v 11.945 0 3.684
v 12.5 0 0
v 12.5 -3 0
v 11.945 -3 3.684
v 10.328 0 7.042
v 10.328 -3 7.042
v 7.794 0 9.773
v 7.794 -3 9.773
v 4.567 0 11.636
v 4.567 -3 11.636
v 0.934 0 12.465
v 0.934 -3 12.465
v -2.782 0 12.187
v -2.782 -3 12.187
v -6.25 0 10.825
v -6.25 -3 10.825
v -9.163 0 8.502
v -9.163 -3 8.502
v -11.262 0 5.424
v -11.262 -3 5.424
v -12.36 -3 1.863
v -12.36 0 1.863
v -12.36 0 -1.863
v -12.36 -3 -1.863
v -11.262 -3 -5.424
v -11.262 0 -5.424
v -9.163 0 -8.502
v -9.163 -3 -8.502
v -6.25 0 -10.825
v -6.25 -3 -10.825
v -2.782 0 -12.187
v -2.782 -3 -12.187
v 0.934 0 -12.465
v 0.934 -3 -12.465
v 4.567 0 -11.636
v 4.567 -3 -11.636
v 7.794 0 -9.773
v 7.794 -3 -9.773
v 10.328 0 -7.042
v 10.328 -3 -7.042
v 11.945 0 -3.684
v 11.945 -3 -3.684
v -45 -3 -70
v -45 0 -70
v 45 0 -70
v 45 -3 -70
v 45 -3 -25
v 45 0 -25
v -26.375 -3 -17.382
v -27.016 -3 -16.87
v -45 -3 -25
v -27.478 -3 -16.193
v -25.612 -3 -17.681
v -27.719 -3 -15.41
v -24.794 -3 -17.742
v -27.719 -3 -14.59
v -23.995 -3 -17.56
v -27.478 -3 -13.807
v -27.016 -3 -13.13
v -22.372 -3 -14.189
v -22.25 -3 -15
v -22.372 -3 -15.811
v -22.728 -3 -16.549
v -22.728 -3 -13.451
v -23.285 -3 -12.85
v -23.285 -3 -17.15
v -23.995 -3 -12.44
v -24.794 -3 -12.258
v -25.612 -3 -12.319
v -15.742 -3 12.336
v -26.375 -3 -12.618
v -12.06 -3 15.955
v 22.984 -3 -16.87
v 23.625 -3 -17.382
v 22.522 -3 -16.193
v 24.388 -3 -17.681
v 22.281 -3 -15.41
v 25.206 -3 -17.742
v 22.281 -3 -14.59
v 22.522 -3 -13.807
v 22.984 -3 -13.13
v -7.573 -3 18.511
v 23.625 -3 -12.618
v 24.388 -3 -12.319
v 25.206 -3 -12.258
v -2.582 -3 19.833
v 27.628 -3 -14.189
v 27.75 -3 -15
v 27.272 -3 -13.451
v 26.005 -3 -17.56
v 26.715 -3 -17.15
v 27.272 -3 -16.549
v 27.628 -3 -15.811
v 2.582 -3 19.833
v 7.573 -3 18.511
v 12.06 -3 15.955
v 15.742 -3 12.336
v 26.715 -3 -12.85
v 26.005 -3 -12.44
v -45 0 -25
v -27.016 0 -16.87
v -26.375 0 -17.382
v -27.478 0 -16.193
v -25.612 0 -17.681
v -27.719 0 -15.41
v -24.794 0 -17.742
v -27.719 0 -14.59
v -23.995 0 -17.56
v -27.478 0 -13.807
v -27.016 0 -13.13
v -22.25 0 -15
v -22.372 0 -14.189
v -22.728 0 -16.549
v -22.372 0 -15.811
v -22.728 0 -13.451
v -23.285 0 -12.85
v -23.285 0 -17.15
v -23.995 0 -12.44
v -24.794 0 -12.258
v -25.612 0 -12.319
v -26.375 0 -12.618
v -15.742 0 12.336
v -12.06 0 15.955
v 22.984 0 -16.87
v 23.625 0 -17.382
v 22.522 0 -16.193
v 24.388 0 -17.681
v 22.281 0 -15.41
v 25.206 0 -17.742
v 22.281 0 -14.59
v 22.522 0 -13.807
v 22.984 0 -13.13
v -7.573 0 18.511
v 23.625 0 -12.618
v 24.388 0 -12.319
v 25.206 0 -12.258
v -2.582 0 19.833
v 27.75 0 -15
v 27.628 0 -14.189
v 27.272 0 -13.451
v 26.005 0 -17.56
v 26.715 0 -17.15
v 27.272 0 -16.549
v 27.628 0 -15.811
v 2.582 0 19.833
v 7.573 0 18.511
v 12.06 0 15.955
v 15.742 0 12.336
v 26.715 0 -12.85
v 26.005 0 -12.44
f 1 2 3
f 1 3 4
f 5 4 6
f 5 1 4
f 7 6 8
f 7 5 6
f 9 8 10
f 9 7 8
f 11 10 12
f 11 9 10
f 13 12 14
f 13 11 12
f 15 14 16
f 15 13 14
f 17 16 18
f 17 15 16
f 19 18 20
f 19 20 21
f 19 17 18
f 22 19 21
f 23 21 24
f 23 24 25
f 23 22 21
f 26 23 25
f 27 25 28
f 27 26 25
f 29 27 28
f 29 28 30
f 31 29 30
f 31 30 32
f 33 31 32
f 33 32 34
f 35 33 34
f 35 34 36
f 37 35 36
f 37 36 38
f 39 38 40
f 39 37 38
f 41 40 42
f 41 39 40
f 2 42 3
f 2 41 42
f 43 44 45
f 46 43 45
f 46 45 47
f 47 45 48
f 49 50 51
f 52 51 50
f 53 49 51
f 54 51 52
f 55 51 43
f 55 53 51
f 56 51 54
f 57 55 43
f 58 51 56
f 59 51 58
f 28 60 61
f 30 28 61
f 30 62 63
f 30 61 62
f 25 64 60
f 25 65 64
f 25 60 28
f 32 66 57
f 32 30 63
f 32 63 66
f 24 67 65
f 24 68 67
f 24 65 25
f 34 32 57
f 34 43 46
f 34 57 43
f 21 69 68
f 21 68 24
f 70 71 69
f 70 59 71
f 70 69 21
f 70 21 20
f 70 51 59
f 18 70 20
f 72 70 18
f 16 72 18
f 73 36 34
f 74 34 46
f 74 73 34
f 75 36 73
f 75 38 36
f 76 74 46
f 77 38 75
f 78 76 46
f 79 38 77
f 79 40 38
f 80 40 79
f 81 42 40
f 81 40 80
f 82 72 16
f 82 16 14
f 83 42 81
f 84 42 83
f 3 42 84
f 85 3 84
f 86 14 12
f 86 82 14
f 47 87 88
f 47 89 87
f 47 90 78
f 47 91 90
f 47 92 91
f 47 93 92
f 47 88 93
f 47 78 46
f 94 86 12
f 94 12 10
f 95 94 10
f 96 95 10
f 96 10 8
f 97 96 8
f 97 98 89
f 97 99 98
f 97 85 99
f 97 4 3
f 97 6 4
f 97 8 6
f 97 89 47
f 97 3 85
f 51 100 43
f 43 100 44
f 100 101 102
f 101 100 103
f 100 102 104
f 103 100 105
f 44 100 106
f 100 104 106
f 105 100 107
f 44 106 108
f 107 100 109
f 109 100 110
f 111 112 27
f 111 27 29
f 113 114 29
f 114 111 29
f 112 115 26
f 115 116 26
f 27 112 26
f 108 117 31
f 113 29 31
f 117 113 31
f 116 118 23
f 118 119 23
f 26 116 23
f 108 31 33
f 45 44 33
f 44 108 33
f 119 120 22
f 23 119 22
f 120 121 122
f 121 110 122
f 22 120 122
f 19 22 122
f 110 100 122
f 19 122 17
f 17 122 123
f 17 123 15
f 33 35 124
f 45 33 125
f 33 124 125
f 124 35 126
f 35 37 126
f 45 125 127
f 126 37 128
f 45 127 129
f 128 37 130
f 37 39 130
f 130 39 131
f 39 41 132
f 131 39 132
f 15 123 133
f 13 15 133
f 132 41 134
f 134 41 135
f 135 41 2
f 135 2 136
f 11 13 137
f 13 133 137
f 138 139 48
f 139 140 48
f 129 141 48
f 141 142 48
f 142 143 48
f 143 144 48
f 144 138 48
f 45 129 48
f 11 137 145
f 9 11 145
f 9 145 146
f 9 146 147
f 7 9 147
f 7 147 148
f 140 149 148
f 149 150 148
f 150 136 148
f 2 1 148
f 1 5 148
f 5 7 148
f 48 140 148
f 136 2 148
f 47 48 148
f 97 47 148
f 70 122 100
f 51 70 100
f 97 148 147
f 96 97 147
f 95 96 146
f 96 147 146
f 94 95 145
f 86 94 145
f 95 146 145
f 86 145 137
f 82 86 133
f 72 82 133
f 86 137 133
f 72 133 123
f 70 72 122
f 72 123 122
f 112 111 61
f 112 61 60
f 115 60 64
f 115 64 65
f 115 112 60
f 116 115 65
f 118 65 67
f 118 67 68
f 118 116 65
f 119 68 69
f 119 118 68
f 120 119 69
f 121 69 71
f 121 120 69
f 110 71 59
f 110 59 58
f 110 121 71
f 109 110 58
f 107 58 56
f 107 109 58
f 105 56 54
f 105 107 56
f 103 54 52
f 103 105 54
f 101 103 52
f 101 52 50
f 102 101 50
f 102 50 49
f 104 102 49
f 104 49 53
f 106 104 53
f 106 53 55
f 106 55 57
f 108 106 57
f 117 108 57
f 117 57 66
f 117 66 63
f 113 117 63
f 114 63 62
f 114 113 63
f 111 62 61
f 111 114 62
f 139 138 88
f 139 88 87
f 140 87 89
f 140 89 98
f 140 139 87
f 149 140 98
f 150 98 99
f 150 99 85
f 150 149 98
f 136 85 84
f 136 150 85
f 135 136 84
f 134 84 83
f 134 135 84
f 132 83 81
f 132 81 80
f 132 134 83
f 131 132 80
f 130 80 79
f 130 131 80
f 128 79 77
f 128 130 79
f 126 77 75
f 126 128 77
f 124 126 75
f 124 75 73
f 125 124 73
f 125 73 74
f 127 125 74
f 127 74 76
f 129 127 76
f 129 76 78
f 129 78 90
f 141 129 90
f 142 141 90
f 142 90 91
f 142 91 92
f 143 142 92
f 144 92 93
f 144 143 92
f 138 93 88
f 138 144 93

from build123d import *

# Parameters (mm, degrees)
F0_R     = 2.75
F0_R_2   = 12.5
F1_DEPTH = 3


with BuildPart() as f1:
    # F0 (on Front) → F1 (new body)
    with BuildSketch(Plane.XZ):
        with BuildLine():
            Line((45, -25), (15.742295, 12.336131))
            ThreePointArc((15.742295, 12.336131), (0, 20), (-15.742295, 12.336131))
            Line((-15.742295, 12.336131), (-45, -25))
            Line((-45, -25), (-45, -70))
            Line((-45, -70), (45, -70))
            Line((45, -70), (45, -25))
        make_face()
        with Locations((-25, -15)):
            Circle(F0_R, mode=Mode.SUBTRACT)
        with Locations((25, -15)):
            Circle(F0_R, mode=Mode.SUBTRACT)
        Circle(F0_R_2, mode=Mode.SUBTRACT)
    extrude(amount=F1_DEPTH)


solid = f1.part
